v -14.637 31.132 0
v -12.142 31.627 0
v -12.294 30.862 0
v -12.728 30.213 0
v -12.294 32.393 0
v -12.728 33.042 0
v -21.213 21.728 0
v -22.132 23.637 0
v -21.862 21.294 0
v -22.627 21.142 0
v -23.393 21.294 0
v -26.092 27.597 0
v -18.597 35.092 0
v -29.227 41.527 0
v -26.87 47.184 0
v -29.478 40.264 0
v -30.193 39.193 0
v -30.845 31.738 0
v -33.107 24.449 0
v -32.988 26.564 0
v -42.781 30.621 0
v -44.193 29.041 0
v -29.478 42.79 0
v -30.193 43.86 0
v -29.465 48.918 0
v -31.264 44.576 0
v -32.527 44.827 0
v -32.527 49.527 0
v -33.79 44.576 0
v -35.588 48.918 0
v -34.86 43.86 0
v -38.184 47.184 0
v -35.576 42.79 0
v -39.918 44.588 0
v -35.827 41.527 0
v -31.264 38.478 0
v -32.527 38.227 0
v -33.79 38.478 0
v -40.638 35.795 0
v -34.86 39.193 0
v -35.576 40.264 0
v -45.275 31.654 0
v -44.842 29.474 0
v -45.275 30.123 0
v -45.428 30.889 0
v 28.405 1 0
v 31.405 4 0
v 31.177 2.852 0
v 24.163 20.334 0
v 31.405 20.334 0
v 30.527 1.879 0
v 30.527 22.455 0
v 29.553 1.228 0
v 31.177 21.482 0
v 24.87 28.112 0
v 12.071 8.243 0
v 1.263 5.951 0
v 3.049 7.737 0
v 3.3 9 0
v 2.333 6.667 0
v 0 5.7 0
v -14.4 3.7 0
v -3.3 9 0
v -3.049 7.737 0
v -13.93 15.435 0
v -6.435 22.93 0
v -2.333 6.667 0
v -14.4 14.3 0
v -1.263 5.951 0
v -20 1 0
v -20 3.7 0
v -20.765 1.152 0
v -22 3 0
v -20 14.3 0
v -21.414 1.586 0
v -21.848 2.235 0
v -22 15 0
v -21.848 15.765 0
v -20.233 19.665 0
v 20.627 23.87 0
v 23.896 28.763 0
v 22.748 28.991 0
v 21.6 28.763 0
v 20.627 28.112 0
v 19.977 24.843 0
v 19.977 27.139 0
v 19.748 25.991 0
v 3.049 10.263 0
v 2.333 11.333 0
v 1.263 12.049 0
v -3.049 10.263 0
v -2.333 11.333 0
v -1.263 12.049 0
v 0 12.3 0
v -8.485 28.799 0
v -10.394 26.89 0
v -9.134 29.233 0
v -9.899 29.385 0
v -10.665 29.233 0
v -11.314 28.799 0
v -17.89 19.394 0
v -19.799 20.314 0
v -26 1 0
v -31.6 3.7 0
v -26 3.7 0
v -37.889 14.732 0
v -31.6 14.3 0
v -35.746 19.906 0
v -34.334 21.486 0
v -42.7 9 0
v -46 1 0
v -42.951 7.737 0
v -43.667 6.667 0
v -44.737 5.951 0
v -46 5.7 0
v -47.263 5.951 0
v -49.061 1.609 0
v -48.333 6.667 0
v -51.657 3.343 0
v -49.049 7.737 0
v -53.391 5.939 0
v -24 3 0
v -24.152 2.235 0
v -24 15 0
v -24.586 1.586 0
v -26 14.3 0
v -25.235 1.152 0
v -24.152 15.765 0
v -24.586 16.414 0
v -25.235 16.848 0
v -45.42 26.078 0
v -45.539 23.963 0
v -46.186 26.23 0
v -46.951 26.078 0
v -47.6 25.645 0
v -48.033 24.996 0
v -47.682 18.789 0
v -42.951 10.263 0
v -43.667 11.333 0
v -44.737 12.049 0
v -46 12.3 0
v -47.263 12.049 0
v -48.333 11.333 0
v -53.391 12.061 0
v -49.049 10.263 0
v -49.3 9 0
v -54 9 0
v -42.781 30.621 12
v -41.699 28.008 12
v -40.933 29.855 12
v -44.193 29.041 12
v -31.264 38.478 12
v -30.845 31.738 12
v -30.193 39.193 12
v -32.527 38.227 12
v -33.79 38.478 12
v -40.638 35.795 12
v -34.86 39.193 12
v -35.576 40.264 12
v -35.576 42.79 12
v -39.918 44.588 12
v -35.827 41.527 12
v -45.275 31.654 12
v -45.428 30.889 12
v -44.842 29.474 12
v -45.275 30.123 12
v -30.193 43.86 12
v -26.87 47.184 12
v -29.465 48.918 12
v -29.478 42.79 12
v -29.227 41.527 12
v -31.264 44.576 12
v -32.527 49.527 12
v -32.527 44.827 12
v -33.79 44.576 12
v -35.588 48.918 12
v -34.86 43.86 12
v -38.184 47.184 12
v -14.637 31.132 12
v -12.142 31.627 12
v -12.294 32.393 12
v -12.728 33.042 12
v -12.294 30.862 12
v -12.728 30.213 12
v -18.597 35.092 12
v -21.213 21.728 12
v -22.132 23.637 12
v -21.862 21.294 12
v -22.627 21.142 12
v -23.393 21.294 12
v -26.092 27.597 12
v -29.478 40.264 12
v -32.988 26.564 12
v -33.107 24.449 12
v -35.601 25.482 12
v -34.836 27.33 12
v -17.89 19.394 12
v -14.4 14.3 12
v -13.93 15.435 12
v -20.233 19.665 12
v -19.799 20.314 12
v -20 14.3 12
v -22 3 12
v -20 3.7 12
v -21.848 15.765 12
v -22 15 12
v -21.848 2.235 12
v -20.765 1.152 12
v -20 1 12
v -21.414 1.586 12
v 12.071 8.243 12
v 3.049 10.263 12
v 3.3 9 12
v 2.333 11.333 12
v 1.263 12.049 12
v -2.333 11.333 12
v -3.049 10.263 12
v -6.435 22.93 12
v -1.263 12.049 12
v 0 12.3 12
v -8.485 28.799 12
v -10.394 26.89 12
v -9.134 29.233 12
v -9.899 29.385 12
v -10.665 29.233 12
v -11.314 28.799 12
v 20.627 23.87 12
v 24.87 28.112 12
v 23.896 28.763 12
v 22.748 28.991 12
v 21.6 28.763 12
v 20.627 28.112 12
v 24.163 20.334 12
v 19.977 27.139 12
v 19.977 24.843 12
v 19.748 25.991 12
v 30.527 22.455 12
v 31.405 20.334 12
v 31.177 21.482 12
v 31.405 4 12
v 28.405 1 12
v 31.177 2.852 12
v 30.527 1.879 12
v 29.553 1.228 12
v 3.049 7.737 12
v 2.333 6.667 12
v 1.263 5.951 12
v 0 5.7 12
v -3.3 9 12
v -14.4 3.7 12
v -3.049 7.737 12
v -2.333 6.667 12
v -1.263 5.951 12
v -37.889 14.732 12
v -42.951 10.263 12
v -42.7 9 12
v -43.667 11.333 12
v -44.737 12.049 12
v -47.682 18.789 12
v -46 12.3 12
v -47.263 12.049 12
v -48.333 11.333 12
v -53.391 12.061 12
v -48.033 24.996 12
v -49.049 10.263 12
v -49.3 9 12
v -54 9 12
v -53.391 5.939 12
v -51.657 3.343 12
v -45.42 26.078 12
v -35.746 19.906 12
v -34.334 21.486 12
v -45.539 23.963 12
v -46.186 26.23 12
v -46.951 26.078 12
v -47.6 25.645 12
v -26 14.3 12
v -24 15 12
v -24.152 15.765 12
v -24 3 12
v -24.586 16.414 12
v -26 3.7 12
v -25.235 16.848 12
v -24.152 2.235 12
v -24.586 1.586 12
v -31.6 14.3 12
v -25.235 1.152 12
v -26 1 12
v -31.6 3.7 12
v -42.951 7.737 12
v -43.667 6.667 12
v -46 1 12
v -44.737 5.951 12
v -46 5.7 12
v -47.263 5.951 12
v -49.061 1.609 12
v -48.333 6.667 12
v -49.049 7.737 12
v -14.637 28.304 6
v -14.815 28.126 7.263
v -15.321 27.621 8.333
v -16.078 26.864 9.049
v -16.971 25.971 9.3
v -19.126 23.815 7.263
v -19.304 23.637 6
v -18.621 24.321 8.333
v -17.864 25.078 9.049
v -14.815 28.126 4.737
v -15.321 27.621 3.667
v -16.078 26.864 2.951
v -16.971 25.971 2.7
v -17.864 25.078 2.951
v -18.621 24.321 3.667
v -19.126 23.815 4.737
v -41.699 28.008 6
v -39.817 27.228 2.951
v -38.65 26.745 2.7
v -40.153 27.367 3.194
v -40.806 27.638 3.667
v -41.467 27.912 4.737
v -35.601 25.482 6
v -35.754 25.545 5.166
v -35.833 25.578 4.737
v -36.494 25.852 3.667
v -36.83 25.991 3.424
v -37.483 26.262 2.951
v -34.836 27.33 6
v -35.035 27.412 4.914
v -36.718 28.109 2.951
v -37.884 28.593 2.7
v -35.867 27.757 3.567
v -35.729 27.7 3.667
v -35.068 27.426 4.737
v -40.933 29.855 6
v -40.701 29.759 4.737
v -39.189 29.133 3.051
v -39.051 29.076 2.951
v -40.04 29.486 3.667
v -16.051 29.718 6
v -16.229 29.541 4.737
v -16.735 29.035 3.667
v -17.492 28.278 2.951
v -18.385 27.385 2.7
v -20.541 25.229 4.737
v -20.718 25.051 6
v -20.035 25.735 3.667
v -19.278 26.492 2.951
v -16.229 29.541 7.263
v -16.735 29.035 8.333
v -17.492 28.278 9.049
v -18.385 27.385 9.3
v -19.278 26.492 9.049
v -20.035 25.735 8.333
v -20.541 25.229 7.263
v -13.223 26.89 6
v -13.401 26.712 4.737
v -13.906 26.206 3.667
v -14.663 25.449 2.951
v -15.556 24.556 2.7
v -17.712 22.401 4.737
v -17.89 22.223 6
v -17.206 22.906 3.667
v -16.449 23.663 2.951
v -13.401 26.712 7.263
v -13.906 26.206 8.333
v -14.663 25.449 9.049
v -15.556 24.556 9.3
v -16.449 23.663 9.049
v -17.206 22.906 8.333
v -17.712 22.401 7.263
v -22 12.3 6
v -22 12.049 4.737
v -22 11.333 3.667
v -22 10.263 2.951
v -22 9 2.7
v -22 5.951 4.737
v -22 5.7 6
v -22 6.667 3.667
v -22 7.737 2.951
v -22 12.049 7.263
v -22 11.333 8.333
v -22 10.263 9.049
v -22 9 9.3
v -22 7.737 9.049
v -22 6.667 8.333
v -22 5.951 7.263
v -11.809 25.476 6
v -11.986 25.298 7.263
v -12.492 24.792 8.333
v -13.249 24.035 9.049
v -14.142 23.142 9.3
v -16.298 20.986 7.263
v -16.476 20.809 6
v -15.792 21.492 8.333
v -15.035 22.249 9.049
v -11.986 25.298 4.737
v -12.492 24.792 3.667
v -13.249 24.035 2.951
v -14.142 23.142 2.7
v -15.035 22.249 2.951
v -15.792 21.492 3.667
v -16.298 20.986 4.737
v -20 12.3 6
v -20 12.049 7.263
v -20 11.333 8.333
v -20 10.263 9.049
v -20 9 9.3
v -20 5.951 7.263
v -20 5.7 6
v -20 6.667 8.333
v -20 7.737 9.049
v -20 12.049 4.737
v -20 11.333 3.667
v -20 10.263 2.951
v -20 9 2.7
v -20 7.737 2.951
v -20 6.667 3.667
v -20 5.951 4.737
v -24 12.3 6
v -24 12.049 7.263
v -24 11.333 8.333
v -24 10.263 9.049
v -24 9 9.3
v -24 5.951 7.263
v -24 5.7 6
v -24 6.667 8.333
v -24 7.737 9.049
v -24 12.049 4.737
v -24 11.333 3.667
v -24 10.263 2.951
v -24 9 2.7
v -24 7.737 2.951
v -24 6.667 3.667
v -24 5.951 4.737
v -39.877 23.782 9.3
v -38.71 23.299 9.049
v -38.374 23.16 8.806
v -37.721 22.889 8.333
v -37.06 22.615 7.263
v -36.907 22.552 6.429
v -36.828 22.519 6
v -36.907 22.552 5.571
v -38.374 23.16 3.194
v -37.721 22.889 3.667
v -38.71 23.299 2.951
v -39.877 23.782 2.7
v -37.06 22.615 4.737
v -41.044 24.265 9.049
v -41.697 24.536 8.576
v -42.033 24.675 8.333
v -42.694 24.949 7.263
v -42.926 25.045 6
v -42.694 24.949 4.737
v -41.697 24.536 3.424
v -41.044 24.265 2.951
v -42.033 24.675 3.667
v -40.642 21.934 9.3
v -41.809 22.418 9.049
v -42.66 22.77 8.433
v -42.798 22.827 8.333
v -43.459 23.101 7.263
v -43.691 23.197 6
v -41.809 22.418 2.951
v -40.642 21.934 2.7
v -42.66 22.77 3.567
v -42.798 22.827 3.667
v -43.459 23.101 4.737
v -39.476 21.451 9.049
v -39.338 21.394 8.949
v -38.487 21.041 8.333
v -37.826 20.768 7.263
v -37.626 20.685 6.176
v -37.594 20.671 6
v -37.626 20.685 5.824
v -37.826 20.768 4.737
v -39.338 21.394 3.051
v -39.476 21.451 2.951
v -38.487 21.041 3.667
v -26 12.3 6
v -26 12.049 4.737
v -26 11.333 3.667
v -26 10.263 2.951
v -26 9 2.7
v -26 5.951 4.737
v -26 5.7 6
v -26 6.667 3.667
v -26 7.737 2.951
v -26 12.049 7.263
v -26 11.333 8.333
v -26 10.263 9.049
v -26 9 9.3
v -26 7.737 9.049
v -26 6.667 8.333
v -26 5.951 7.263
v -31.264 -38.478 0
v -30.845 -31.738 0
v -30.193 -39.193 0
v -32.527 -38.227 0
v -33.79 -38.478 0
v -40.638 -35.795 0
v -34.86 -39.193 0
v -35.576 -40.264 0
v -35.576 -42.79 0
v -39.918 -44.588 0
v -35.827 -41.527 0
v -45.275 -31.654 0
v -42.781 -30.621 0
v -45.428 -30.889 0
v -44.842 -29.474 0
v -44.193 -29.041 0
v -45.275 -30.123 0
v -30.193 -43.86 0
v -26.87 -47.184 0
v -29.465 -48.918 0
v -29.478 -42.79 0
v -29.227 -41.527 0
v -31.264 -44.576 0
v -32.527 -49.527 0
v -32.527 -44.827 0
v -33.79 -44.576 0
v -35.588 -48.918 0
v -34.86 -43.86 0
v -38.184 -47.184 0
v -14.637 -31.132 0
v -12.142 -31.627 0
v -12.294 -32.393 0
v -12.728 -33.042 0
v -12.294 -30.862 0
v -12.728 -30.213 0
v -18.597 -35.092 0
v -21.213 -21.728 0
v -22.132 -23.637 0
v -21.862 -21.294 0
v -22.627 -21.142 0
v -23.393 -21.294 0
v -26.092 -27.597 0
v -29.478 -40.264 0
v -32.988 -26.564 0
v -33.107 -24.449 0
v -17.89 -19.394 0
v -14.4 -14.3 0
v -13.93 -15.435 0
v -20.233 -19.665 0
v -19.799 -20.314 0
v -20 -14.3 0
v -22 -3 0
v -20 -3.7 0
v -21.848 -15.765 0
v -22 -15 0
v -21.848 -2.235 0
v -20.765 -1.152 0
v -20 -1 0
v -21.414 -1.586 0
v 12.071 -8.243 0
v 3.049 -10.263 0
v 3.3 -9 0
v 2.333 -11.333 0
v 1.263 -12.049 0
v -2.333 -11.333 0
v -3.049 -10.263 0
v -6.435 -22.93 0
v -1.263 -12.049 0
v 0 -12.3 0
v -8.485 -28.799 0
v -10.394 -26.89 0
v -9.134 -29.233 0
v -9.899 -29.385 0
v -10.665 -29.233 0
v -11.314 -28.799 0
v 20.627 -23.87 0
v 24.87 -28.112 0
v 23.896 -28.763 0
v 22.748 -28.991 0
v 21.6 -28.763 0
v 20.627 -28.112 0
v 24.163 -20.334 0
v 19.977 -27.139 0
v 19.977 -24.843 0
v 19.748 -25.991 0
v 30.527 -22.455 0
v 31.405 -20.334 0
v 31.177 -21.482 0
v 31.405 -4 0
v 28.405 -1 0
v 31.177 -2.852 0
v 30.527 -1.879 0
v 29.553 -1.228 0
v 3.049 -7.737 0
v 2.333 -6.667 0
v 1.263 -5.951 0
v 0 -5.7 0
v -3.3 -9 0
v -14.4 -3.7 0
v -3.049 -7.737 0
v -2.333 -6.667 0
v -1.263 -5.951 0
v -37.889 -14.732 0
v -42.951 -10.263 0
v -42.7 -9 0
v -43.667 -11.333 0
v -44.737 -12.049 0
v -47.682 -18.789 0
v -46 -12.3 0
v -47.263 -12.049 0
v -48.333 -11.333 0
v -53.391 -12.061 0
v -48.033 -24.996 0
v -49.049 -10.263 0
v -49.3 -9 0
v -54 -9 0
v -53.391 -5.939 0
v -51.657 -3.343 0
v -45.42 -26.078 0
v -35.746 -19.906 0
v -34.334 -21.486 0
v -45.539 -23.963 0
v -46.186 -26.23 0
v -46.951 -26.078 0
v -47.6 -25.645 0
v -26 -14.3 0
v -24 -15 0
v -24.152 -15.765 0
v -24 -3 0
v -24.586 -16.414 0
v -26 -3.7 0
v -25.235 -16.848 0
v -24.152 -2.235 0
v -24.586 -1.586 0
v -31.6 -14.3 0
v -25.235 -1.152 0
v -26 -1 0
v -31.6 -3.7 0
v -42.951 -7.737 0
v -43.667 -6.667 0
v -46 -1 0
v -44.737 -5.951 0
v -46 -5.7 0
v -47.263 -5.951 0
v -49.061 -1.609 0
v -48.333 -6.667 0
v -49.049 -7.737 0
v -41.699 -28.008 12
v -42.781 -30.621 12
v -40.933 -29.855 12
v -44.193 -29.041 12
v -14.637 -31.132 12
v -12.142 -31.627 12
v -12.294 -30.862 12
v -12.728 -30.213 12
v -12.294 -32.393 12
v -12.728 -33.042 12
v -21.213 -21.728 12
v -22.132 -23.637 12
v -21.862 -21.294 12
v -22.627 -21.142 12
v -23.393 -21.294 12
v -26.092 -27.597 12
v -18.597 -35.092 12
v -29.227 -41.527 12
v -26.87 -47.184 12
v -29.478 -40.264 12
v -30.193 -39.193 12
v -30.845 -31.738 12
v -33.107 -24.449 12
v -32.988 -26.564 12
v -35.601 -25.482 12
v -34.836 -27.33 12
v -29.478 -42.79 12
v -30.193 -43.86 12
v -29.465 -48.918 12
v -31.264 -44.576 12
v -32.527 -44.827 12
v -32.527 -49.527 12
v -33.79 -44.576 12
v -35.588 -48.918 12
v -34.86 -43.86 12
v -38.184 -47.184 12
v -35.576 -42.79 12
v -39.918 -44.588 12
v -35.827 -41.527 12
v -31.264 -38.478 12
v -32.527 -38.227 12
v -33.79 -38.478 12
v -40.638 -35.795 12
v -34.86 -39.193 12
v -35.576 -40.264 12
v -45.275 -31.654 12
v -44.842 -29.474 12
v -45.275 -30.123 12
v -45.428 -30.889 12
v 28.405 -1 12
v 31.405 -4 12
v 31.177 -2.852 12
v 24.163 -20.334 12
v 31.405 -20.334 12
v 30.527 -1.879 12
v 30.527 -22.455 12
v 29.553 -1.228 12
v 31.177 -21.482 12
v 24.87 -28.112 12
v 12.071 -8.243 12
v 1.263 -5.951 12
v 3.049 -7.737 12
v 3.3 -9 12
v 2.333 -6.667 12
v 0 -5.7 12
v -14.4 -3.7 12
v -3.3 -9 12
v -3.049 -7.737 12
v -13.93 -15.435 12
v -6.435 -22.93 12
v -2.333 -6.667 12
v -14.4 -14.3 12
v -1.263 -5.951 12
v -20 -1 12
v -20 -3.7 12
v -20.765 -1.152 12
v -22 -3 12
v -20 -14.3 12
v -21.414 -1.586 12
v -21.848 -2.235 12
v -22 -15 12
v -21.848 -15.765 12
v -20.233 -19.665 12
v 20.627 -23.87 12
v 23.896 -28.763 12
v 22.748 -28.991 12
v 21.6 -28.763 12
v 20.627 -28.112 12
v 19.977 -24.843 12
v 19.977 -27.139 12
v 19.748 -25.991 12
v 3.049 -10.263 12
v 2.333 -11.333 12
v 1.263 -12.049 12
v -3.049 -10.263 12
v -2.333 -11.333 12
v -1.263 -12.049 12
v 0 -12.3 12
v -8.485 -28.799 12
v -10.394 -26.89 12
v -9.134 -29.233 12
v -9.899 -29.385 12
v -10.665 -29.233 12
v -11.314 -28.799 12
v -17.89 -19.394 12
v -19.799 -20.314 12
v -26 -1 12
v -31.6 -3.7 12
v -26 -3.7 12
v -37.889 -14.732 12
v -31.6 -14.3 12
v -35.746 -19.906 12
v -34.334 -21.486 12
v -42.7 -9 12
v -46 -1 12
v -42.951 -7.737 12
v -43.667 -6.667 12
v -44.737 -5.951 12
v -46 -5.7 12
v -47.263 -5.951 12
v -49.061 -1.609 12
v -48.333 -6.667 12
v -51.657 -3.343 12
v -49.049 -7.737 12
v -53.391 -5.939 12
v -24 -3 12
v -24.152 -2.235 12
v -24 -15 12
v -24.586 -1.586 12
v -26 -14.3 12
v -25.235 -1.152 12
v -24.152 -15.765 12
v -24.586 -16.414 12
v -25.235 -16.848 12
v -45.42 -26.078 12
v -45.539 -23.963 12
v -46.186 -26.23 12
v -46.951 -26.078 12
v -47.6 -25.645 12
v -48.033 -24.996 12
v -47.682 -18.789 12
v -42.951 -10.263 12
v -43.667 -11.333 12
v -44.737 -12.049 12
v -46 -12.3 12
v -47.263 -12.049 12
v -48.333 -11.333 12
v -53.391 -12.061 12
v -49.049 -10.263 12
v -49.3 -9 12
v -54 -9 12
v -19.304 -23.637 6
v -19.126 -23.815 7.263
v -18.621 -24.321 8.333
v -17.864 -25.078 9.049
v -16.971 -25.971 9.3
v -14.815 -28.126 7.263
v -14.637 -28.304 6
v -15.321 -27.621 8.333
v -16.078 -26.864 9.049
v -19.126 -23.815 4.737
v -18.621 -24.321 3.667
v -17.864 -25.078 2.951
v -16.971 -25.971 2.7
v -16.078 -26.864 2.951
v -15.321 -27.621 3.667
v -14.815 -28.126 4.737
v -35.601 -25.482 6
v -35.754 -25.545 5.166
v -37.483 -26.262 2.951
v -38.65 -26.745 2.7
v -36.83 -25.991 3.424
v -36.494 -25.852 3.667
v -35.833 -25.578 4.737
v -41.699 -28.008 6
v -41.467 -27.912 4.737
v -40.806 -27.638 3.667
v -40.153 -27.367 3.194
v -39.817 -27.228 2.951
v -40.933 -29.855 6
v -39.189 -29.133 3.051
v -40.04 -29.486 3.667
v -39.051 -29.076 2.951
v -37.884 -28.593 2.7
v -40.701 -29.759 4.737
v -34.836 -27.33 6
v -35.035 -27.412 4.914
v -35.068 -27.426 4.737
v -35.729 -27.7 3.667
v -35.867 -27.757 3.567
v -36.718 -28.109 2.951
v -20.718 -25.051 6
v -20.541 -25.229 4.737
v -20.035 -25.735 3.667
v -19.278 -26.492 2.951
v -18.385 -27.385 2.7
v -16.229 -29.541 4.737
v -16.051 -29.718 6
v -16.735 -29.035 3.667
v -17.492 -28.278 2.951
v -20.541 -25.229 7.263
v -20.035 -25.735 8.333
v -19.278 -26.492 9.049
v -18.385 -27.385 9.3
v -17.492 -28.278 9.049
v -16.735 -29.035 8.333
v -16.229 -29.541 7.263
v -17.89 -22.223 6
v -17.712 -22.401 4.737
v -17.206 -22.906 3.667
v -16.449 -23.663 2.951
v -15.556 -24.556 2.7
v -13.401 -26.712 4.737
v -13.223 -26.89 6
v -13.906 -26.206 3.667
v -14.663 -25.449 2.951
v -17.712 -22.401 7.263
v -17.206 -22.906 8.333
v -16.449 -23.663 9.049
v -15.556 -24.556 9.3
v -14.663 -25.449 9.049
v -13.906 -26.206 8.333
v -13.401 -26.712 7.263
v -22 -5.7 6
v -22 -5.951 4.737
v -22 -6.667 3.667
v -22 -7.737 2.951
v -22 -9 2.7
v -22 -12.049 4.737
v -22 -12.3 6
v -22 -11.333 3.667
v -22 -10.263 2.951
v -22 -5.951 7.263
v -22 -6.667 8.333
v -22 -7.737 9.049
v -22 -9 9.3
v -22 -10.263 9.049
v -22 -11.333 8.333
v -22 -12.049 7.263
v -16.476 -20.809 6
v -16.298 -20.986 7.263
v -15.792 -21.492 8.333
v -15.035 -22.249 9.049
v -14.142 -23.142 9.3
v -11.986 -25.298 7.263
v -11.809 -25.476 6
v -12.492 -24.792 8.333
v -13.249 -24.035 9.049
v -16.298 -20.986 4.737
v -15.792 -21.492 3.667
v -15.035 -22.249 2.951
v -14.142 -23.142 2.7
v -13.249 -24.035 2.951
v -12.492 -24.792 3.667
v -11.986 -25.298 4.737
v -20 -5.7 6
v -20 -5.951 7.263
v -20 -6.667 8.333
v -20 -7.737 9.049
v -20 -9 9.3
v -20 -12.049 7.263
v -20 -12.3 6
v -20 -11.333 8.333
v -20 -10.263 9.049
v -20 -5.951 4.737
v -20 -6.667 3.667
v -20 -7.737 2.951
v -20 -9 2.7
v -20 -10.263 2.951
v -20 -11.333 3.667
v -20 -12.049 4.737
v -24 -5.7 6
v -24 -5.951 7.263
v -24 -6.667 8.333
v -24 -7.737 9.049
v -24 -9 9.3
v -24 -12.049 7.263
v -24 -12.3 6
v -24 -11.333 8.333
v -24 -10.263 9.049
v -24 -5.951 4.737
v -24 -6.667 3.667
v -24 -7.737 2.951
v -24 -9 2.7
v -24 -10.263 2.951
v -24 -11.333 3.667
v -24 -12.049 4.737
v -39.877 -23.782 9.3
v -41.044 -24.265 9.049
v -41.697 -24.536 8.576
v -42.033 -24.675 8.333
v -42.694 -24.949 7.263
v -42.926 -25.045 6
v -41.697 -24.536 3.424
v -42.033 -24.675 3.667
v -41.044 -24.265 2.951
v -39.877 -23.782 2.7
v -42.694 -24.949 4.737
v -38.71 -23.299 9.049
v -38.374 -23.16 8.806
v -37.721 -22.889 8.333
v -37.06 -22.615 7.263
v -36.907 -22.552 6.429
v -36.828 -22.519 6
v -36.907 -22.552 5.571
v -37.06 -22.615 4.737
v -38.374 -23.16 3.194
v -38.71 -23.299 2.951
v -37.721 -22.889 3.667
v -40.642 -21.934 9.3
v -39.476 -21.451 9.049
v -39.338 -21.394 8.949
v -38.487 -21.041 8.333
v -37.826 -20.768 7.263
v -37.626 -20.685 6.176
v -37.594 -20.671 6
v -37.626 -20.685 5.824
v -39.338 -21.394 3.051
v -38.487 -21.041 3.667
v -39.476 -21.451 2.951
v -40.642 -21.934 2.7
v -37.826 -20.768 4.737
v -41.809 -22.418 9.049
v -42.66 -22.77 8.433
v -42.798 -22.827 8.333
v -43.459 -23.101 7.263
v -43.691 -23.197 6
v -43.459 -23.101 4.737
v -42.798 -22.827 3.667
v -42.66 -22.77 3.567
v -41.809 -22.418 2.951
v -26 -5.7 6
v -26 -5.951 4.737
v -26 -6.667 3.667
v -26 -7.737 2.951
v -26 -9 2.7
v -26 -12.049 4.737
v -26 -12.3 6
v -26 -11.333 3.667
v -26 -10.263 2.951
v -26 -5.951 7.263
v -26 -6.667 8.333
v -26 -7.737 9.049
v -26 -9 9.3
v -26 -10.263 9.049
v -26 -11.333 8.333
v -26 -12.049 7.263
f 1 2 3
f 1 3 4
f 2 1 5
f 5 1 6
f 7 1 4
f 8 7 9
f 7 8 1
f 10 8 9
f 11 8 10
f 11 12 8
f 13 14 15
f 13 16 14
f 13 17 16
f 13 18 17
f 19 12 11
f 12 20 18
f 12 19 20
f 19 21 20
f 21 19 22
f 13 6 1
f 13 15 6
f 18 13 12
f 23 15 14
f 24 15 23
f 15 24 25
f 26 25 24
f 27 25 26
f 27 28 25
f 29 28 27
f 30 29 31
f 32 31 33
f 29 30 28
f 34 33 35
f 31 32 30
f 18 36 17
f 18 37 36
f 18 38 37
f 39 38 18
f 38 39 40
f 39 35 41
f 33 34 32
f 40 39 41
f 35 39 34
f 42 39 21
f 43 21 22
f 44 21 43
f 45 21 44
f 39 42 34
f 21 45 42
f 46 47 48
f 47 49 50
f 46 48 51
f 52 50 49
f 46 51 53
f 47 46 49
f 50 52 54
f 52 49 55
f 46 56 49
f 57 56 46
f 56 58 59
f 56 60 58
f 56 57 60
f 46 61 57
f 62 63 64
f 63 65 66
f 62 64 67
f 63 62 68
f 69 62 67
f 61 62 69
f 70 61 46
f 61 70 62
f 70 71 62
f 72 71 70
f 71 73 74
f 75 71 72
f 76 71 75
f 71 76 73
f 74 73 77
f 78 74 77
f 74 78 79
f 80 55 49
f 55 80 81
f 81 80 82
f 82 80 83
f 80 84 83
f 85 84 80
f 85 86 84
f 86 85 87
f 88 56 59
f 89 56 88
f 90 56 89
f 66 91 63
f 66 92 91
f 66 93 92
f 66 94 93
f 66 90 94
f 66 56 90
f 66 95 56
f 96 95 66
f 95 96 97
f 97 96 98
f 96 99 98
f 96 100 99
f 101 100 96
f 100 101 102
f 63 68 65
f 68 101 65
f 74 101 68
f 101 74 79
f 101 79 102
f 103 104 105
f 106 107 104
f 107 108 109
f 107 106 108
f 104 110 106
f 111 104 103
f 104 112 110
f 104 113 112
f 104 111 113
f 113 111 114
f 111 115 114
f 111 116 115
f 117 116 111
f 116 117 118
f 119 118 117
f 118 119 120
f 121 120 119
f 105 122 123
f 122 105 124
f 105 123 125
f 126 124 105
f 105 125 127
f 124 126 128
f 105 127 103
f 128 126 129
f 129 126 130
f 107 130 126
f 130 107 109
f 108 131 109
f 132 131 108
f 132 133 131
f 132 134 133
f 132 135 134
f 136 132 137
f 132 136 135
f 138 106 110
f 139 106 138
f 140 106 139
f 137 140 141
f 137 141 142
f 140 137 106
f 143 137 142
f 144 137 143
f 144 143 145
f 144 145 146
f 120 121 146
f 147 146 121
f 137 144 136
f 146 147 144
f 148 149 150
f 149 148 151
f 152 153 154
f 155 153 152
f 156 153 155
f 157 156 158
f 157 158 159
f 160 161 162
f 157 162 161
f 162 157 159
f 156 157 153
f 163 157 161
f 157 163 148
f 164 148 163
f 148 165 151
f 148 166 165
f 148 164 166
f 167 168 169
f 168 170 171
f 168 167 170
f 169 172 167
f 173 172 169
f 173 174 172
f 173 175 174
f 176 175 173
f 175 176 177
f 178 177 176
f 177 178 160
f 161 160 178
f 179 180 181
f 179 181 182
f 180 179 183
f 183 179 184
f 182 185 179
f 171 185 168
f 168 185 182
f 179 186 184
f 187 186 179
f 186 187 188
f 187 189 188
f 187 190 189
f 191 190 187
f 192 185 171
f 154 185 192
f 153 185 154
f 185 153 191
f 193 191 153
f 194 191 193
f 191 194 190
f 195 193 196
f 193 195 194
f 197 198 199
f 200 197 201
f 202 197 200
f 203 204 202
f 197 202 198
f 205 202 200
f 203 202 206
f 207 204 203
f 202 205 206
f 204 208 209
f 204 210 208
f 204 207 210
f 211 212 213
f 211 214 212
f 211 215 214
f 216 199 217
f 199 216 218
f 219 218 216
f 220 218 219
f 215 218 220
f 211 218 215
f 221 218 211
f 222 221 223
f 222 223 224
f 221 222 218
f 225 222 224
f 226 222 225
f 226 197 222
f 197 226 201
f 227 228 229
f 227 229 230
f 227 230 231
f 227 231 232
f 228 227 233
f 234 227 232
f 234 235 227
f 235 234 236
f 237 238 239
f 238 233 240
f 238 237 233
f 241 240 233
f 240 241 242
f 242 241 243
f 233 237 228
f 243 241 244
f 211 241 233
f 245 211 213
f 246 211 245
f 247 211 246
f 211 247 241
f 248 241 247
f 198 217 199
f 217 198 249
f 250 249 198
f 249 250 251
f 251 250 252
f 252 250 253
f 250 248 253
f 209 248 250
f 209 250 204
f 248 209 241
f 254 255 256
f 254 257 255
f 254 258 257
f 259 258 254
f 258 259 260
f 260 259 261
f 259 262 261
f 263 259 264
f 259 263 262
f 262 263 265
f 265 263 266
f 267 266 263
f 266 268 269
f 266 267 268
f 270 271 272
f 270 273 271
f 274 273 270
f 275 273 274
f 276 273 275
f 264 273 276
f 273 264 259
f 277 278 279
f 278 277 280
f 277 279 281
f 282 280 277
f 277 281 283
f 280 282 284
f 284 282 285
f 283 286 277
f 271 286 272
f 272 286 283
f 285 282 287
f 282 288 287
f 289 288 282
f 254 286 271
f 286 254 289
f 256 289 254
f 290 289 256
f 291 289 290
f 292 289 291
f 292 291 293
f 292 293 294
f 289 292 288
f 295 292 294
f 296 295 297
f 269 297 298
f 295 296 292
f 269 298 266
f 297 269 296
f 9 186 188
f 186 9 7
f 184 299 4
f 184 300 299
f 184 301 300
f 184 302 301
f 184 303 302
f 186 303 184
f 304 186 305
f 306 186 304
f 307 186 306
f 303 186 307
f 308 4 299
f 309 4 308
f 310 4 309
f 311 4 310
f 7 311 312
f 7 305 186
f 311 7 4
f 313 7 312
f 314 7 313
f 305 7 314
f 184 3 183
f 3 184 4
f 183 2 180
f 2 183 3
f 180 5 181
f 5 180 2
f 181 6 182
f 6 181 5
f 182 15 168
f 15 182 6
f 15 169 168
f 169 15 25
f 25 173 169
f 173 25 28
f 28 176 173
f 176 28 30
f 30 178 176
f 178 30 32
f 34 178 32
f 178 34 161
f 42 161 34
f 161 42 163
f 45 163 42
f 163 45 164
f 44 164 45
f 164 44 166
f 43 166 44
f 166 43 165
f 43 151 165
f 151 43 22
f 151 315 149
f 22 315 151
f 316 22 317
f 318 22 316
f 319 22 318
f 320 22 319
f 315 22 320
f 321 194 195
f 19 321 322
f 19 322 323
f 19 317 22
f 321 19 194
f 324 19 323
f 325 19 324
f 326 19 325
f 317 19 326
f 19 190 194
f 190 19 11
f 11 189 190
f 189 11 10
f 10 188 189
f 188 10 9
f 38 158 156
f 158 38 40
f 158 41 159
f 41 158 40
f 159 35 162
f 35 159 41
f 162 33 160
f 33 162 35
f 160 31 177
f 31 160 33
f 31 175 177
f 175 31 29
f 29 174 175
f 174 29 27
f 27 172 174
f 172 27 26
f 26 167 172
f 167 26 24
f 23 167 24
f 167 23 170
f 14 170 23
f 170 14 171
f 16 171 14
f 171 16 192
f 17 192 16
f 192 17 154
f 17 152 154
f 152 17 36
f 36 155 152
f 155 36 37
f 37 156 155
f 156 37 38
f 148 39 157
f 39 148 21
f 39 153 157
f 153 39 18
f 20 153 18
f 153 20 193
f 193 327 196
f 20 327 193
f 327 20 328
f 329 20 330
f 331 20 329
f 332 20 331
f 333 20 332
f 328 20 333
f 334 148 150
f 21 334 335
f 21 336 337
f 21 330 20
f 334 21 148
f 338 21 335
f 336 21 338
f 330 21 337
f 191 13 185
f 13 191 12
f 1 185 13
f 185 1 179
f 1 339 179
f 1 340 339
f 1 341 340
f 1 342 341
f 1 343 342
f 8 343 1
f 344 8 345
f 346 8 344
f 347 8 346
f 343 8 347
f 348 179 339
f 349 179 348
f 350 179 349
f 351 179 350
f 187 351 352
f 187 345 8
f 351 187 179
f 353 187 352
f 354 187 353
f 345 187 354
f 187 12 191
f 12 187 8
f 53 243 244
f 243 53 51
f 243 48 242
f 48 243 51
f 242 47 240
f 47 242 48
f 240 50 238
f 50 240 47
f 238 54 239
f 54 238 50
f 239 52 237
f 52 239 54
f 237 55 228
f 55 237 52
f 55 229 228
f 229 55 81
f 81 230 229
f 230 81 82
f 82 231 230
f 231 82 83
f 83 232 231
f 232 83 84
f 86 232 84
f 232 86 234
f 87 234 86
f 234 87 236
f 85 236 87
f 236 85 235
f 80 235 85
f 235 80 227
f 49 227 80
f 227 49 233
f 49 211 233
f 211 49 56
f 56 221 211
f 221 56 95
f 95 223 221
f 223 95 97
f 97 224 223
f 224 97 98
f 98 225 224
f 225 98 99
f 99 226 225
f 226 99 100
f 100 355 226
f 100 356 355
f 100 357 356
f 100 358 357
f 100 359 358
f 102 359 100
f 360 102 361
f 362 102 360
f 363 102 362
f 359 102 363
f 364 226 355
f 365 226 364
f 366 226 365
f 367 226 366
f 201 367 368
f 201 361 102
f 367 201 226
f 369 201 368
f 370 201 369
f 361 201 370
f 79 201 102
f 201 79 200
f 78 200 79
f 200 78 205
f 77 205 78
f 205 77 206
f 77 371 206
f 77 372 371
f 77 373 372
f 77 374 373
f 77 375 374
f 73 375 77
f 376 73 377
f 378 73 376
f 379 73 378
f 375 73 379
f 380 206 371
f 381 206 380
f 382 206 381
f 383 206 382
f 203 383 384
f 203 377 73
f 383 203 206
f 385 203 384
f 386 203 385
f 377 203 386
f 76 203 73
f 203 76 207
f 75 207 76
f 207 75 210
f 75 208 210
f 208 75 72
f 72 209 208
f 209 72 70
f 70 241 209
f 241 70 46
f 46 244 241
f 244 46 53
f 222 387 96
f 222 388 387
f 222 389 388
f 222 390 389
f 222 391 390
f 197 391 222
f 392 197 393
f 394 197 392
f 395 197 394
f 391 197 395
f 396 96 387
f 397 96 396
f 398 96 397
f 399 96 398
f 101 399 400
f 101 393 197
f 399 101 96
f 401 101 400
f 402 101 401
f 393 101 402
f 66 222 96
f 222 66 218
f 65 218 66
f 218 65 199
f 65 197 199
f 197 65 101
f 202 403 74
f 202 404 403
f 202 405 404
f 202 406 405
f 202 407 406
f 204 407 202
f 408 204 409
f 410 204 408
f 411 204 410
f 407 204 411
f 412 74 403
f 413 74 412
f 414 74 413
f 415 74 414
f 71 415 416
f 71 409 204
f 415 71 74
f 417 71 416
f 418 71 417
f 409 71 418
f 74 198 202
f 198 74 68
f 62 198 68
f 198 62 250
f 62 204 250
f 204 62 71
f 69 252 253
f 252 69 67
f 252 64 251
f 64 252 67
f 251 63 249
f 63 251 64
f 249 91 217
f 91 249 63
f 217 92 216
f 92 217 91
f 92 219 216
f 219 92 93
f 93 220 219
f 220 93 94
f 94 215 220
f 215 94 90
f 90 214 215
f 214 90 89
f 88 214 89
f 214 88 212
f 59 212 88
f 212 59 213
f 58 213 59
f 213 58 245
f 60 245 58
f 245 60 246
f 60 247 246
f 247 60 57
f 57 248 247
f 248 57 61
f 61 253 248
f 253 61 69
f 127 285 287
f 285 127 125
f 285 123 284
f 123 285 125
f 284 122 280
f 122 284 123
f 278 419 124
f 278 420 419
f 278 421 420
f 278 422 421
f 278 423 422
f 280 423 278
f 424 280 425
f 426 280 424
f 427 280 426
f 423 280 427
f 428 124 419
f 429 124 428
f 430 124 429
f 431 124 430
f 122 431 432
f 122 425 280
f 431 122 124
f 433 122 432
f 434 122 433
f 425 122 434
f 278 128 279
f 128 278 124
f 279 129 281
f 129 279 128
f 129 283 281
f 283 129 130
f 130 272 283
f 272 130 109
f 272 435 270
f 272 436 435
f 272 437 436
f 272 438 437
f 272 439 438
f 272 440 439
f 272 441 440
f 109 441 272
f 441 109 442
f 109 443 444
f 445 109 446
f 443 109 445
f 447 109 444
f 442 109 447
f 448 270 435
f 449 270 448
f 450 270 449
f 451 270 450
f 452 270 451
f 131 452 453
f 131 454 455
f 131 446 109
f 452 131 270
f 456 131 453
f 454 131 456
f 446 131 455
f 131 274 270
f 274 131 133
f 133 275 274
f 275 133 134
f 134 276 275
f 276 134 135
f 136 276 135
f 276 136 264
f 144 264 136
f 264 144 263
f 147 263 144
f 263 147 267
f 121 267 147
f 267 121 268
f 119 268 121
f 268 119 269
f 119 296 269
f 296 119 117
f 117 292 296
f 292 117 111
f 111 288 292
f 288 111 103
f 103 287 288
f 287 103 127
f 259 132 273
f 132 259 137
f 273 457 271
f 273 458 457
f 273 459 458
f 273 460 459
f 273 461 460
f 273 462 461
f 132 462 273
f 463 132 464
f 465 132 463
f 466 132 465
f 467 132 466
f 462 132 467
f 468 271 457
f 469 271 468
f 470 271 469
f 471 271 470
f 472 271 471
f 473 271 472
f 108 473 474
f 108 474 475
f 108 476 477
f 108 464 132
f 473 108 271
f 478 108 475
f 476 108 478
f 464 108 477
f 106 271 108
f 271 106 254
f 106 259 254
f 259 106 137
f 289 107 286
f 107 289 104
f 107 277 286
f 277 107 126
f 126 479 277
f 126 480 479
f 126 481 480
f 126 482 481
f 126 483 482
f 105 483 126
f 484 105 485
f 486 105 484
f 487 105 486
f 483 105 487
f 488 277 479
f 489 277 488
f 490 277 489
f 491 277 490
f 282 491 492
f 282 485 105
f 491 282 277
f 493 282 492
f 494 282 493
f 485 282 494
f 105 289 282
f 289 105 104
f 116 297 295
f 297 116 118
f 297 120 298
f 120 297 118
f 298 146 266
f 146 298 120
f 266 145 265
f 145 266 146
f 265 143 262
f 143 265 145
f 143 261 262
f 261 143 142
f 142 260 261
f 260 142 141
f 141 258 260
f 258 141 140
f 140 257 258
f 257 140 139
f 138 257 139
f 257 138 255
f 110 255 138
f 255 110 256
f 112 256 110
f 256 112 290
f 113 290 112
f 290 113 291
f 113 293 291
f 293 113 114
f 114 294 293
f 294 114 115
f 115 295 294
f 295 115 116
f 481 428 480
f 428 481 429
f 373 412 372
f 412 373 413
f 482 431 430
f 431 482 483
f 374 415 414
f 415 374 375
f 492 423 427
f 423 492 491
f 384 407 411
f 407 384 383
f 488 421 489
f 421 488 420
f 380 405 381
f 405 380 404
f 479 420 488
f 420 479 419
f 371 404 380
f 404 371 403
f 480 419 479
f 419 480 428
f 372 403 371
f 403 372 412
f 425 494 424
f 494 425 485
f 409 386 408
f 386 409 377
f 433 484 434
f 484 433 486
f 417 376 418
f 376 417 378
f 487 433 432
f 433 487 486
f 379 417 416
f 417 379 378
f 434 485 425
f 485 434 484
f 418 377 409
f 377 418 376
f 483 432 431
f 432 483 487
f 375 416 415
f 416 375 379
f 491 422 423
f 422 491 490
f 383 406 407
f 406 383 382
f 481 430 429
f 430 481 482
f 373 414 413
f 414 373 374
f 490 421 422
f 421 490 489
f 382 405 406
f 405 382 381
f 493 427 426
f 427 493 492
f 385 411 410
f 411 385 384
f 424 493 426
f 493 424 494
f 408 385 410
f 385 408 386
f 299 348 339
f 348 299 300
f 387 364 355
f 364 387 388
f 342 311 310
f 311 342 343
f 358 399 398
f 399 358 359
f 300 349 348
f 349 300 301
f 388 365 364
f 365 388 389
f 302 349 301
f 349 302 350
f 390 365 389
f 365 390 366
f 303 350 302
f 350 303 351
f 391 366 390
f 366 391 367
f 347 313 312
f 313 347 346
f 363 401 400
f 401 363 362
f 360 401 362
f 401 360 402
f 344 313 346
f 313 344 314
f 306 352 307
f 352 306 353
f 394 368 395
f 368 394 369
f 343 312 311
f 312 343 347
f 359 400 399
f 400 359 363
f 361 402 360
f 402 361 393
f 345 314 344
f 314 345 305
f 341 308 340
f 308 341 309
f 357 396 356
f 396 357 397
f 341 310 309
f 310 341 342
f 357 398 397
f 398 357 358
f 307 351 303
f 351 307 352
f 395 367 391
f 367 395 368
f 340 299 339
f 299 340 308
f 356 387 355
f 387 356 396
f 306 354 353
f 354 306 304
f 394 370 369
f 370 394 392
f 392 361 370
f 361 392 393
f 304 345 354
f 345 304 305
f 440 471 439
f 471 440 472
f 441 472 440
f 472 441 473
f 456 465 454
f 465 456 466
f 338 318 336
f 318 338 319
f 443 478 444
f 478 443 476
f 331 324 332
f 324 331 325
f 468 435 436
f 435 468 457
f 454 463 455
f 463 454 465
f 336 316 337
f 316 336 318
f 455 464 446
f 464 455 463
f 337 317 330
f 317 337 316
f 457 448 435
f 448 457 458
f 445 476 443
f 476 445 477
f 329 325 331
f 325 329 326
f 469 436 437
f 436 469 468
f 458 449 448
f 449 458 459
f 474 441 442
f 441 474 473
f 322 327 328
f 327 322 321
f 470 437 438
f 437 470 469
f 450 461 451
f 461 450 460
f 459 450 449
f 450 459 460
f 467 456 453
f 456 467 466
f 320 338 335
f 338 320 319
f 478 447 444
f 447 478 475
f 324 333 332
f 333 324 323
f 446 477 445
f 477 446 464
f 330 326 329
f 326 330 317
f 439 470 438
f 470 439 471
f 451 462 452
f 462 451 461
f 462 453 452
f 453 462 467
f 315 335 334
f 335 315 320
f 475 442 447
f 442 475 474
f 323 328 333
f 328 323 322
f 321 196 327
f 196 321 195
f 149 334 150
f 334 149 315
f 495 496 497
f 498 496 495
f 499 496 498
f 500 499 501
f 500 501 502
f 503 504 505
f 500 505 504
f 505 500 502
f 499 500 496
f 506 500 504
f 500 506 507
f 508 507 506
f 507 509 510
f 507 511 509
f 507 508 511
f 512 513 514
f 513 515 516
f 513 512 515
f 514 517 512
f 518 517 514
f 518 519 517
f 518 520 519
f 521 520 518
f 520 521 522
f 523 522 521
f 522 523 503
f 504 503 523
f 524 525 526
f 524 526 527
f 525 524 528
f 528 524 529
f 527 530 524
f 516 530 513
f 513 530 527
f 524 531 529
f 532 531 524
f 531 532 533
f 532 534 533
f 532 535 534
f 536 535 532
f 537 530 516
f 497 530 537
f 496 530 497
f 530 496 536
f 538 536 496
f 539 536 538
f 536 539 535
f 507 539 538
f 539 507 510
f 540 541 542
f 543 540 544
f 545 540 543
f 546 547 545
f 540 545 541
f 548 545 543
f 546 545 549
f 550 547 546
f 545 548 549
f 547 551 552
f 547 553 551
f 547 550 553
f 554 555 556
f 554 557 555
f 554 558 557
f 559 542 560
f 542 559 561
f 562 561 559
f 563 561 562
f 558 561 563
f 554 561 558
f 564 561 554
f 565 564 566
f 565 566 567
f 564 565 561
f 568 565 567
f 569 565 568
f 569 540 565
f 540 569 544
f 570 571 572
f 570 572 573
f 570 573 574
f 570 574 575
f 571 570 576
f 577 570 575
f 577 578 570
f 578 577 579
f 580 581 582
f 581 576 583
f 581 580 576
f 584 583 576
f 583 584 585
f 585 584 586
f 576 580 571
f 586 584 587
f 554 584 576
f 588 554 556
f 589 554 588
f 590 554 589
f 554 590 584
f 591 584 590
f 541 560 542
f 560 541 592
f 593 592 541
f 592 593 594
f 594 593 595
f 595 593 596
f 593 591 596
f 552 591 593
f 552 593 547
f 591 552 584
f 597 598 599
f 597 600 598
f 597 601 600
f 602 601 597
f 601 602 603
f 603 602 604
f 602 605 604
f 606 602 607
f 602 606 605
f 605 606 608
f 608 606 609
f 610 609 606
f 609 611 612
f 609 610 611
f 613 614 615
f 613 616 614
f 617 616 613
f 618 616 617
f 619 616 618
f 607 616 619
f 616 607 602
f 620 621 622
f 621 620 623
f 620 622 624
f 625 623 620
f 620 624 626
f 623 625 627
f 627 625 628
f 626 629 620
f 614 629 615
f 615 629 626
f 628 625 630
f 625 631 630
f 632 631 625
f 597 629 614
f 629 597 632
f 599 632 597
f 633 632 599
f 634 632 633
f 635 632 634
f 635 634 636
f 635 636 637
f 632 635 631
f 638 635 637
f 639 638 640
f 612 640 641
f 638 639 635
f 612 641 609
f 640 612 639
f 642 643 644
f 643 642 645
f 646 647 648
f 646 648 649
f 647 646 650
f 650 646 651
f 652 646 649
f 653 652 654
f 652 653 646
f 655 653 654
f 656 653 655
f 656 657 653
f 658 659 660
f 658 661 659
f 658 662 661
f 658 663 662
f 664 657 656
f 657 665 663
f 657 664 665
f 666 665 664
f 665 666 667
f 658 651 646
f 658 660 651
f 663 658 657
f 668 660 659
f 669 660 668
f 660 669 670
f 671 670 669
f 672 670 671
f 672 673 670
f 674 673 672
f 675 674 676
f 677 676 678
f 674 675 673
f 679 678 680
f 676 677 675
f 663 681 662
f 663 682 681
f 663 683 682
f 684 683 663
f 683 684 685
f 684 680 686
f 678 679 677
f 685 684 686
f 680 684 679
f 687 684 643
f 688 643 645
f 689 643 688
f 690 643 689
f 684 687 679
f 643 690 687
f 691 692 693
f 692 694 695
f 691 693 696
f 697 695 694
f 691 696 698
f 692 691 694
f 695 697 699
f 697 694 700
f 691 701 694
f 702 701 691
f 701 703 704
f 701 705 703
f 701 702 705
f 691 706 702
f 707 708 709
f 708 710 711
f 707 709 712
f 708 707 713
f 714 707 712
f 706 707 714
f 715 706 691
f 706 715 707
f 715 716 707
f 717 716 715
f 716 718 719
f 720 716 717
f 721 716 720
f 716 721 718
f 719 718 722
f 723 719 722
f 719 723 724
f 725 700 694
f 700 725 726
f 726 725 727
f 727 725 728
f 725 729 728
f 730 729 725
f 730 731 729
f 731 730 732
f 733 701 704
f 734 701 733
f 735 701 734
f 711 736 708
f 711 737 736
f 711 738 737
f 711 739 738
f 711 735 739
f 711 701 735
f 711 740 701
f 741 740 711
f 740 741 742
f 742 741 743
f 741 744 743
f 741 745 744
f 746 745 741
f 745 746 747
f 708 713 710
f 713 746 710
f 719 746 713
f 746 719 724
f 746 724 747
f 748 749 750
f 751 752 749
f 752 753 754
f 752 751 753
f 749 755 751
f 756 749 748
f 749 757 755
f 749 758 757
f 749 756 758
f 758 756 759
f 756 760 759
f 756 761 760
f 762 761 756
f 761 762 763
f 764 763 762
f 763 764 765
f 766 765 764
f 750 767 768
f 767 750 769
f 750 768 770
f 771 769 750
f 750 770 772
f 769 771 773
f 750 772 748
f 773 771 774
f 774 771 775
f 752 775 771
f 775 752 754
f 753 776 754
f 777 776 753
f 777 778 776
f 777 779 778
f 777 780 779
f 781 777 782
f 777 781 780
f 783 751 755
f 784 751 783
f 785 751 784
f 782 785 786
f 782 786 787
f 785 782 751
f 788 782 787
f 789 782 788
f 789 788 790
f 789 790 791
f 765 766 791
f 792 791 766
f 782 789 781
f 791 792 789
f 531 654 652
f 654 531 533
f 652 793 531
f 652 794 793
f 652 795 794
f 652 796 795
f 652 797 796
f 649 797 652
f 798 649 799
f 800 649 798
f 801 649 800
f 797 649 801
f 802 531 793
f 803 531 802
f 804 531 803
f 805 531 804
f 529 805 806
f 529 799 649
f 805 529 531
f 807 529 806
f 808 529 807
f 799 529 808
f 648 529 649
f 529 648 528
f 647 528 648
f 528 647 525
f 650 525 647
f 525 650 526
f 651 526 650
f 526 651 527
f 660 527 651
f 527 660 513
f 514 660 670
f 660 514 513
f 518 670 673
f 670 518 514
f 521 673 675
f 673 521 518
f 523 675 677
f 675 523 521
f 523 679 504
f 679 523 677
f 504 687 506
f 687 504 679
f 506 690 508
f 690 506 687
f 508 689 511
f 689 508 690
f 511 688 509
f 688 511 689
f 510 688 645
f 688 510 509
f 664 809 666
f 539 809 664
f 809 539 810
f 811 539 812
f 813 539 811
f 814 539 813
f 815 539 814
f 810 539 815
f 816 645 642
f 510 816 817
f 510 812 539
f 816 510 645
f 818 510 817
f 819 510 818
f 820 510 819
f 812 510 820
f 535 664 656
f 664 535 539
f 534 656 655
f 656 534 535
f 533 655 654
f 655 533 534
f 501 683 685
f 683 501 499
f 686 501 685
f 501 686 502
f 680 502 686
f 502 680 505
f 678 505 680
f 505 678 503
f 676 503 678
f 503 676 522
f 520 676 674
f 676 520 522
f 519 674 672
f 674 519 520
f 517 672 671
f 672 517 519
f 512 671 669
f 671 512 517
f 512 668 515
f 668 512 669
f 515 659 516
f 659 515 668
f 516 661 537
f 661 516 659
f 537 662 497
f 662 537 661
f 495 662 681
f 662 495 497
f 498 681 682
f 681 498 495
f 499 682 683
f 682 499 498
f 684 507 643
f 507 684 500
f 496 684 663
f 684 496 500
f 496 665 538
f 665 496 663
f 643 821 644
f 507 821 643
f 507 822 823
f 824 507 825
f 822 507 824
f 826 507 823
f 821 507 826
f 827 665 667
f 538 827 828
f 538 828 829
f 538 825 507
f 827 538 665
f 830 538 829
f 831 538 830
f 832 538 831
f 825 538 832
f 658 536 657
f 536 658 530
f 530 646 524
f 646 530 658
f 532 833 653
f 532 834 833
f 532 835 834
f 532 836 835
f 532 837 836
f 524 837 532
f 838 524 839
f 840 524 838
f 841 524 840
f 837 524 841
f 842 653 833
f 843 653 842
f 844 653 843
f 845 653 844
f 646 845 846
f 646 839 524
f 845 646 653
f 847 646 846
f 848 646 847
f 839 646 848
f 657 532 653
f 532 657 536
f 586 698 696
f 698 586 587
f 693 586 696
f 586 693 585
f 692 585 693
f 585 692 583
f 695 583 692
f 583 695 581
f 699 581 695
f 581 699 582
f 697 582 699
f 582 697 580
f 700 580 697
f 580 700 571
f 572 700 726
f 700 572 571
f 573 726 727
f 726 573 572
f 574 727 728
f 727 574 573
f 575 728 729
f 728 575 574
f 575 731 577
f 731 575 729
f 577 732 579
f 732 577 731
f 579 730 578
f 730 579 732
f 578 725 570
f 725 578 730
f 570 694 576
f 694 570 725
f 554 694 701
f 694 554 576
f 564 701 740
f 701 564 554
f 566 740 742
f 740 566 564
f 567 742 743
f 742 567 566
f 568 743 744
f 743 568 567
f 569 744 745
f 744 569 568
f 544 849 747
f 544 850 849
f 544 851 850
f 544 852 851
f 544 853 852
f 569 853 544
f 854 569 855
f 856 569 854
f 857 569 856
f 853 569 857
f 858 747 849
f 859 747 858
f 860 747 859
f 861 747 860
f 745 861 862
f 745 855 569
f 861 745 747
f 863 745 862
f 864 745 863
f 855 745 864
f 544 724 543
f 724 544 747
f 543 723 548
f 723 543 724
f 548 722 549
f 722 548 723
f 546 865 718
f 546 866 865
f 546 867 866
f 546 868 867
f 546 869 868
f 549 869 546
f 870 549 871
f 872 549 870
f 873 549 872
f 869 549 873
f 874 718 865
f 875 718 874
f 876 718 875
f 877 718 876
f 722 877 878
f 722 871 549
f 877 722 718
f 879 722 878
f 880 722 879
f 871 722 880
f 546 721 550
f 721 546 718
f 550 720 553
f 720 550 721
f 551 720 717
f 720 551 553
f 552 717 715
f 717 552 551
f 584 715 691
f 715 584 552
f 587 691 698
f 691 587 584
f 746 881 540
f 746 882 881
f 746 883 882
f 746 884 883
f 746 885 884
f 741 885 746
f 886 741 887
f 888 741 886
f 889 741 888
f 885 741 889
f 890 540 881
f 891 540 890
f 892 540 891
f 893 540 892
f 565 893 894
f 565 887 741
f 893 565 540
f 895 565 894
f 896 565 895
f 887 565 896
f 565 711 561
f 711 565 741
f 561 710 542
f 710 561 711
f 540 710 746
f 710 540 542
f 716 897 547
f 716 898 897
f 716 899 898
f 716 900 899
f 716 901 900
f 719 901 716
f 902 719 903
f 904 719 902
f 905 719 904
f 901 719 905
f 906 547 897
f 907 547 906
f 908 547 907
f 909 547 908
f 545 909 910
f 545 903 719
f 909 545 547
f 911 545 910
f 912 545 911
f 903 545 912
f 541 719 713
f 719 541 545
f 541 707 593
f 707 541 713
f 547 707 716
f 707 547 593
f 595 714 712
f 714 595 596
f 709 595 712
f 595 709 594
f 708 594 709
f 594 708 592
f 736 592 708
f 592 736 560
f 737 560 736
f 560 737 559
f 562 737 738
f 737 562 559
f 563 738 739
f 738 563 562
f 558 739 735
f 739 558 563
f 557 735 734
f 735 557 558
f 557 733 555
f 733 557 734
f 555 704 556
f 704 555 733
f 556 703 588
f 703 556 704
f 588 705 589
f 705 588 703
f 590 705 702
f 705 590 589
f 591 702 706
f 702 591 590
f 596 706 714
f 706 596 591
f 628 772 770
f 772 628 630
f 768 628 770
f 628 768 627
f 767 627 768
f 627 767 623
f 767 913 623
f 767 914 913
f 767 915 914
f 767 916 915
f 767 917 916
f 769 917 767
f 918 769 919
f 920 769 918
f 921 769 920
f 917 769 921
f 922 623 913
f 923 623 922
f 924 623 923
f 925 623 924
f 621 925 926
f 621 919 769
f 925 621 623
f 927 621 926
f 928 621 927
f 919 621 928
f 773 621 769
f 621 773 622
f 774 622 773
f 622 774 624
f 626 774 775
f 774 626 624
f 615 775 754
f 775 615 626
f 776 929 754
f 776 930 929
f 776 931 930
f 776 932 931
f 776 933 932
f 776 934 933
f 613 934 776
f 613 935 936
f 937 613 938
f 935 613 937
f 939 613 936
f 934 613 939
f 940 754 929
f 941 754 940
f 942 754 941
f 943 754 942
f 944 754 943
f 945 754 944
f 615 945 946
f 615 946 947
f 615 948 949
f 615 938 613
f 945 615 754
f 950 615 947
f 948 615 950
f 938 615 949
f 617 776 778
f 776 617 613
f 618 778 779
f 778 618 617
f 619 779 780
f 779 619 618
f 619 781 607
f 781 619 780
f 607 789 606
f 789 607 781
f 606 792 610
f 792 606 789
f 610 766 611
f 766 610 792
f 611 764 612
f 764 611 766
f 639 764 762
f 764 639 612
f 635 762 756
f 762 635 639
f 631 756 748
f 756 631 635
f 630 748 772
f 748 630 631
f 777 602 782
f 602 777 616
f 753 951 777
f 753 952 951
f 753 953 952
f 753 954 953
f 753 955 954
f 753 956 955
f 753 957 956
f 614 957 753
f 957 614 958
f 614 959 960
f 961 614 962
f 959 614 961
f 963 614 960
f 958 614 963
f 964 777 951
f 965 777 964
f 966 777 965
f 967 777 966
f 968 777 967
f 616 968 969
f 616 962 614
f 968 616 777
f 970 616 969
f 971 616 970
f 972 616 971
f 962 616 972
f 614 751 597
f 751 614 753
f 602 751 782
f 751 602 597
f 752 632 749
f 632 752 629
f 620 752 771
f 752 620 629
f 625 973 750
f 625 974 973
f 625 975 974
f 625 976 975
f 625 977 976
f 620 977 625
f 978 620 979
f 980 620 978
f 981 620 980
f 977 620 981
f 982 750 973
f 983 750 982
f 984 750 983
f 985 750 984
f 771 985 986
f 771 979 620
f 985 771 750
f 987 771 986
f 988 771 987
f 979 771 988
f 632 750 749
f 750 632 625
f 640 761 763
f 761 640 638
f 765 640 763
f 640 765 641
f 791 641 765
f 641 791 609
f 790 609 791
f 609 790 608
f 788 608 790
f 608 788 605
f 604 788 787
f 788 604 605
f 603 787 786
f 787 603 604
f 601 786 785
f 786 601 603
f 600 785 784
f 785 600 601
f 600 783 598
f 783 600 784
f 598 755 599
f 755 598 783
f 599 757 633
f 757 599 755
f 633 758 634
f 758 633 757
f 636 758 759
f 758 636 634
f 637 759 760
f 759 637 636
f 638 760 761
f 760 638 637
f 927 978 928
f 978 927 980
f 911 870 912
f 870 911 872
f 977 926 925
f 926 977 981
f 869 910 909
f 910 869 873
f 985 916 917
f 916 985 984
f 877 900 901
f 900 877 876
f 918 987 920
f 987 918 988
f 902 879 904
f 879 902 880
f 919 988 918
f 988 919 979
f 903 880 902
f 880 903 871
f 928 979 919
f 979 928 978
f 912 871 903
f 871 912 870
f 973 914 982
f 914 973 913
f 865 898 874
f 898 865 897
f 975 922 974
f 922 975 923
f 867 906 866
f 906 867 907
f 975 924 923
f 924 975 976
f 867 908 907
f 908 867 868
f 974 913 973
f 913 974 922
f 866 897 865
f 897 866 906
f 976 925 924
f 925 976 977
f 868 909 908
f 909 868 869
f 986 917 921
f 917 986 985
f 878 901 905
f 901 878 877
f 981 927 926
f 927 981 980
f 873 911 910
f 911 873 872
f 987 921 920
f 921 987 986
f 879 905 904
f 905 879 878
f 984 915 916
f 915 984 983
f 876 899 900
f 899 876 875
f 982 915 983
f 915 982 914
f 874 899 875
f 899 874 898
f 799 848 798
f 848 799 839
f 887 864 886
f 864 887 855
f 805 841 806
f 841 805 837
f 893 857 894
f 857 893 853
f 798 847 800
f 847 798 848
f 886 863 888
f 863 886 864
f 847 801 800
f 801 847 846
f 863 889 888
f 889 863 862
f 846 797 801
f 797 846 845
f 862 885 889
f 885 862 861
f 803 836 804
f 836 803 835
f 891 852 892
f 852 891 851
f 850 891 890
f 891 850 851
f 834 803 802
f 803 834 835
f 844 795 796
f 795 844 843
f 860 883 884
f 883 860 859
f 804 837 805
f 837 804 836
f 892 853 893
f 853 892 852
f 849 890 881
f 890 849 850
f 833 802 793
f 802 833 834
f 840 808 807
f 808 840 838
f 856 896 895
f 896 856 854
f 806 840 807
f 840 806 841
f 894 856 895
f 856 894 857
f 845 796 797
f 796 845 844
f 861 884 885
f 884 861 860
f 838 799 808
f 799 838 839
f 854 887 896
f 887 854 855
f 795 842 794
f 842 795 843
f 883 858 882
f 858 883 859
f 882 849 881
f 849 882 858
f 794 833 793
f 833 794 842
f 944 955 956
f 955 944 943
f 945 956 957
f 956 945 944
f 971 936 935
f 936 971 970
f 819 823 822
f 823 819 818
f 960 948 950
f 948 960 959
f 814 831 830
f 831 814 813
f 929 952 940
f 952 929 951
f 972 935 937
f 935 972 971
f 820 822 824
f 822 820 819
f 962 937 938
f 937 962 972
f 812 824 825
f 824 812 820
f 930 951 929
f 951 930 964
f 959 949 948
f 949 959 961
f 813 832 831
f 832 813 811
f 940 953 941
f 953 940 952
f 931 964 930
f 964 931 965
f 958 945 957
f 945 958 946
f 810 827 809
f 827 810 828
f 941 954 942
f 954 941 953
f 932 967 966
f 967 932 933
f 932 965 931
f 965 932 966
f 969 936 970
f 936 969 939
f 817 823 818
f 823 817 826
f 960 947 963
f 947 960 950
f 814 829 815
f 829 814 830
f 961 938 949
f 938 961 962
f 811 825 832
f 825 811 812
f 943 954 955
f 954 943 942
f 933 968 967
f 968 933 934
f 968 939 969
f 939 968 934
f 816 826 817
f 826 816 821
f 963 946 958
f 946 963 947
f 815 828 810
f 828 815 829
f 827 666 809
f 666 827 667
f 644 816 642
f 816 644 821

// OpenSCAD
/*
 * Copyright (C) 2017 Marco Lochen
 *
 * This work is licensed under the Creative Commons Attribution 4.0
 * International License. To view a copy of this license, visit
 * http://creativecommons.org/licenses/by/4.0/ or send a letter to Creative
 * Commons, PO Box 1866, Mountain View, CA 94042, USA.
 */

ro = 8;                     // radii on the outside
ri = 2;                     // radii on the inside
rf = 3;                     // radii on the front
offset = 46;                // offset for corner parts
gap = 0.3;                  // gap for places where parts are joined
lh = 16.5 + 2 * gap;        // height of the bottom part of the laptop
$fn = 16;

module hull_corners(back = false)
{
    d = back ? 16 : 22;
    translate([-ro + ri, d - ri]) circle(r = ri);
    translate([ro - ri, d - ri]) circle(r = ri);
}

module nut_insert(back = false)
{
    d = back ? 14 : 20;
    translate([0, d - ((5 + 2 * gap) / 2)]) square([10 + 2 * gap, 5 + 2 * gap], center = true);
}

module front()
{
    offset = (ro - rf) / tan(22.5);
    hull()
    {
        translate([offset - 8, ro + lh + rf]) circle(r = rf);
        translate([offset, ro + lh + rf]) circle(r = rf);
    }       
    hull()
    {
        translate([offset, ro + lh + rf]) circle(r = rf);
        translate([offset, ro - rf]) circle(r = rf);
        translate([offset + (lh + 2 * rf) / 2, ro - rf + (lh + 2 * rf) / 2]) circle(r = 3);
    }
    hull()
    {
        circle(r = ro);
        translate([offset, ro - rf]) circle(r = rf);
    }
}

module parts_2D()
{
    difference()
    {
        union()
        {
            hull()
            {
                circle(r = ro);
                rotate(90) hull_corners();
                rotate(45) hull_corners();
            }
            rotate(-45) front();
        }
        circle(r = 3 + gap);
        rotate(90) nut_insert();
        rotate(45) nut_insert();
    }

    translate([-offset, 0]) difference()
    {
        hull()
        {
            circle(r = ro);
            rotate(-90) hull_corners();
            rotate(-22.5) hull_corners(back = true);
        }
        circle(r = 3 + gap);
        rotate(-90) nut_insert();
        rotate(-22.5) nut_insert(back = true);
    }

    rotate(-45) translate([-offset, 0]) difference()
    {
        hull()
        {
            circle(r = ro);
            rotate(-90) hull_corners();
            rotate(202.5) hull_corners(back = true);
        }
        circle(r = 3 + gap);
        rotate(-90) nut_insert();
        rotate(202.5) nut_insert(back = true);
    }
}

module parts_3D()
{
    difference()
    {
        linear_extrude(12, convexity = 6) parts_2D();
        translate([-0.5 * offset, 0, 6]) rotate([0, 90, 0])
            cylinder(r = 3 + gap, h = offset - 2 * 18, center = true);
        rotate([0, 0, -45]) translate([-0.5 * offset, 0, 6]) rotate([0, 90, 0])
            cylinder(r = 3 + gap, h = offset - 2 * 18, center = true);
        rotate([0, 0, -22.5]) translate([-offset * cos(22.5), 0, 6]) rotate([90, 0, 0])
            cylinder(r = 3 + gap, h = 10, center = true);
        rotate([0, 0, -22.5]) translate([-offset * cos(22.5), 2, 12])
            cube([6 + 2 * gap, 4, 12], center = true);
    }
}

translate([0, ro + 1, 0]) parts_3D();
mirror([0, 1, 0]) translate([0, ro + 1, 0]) parts_3D();
